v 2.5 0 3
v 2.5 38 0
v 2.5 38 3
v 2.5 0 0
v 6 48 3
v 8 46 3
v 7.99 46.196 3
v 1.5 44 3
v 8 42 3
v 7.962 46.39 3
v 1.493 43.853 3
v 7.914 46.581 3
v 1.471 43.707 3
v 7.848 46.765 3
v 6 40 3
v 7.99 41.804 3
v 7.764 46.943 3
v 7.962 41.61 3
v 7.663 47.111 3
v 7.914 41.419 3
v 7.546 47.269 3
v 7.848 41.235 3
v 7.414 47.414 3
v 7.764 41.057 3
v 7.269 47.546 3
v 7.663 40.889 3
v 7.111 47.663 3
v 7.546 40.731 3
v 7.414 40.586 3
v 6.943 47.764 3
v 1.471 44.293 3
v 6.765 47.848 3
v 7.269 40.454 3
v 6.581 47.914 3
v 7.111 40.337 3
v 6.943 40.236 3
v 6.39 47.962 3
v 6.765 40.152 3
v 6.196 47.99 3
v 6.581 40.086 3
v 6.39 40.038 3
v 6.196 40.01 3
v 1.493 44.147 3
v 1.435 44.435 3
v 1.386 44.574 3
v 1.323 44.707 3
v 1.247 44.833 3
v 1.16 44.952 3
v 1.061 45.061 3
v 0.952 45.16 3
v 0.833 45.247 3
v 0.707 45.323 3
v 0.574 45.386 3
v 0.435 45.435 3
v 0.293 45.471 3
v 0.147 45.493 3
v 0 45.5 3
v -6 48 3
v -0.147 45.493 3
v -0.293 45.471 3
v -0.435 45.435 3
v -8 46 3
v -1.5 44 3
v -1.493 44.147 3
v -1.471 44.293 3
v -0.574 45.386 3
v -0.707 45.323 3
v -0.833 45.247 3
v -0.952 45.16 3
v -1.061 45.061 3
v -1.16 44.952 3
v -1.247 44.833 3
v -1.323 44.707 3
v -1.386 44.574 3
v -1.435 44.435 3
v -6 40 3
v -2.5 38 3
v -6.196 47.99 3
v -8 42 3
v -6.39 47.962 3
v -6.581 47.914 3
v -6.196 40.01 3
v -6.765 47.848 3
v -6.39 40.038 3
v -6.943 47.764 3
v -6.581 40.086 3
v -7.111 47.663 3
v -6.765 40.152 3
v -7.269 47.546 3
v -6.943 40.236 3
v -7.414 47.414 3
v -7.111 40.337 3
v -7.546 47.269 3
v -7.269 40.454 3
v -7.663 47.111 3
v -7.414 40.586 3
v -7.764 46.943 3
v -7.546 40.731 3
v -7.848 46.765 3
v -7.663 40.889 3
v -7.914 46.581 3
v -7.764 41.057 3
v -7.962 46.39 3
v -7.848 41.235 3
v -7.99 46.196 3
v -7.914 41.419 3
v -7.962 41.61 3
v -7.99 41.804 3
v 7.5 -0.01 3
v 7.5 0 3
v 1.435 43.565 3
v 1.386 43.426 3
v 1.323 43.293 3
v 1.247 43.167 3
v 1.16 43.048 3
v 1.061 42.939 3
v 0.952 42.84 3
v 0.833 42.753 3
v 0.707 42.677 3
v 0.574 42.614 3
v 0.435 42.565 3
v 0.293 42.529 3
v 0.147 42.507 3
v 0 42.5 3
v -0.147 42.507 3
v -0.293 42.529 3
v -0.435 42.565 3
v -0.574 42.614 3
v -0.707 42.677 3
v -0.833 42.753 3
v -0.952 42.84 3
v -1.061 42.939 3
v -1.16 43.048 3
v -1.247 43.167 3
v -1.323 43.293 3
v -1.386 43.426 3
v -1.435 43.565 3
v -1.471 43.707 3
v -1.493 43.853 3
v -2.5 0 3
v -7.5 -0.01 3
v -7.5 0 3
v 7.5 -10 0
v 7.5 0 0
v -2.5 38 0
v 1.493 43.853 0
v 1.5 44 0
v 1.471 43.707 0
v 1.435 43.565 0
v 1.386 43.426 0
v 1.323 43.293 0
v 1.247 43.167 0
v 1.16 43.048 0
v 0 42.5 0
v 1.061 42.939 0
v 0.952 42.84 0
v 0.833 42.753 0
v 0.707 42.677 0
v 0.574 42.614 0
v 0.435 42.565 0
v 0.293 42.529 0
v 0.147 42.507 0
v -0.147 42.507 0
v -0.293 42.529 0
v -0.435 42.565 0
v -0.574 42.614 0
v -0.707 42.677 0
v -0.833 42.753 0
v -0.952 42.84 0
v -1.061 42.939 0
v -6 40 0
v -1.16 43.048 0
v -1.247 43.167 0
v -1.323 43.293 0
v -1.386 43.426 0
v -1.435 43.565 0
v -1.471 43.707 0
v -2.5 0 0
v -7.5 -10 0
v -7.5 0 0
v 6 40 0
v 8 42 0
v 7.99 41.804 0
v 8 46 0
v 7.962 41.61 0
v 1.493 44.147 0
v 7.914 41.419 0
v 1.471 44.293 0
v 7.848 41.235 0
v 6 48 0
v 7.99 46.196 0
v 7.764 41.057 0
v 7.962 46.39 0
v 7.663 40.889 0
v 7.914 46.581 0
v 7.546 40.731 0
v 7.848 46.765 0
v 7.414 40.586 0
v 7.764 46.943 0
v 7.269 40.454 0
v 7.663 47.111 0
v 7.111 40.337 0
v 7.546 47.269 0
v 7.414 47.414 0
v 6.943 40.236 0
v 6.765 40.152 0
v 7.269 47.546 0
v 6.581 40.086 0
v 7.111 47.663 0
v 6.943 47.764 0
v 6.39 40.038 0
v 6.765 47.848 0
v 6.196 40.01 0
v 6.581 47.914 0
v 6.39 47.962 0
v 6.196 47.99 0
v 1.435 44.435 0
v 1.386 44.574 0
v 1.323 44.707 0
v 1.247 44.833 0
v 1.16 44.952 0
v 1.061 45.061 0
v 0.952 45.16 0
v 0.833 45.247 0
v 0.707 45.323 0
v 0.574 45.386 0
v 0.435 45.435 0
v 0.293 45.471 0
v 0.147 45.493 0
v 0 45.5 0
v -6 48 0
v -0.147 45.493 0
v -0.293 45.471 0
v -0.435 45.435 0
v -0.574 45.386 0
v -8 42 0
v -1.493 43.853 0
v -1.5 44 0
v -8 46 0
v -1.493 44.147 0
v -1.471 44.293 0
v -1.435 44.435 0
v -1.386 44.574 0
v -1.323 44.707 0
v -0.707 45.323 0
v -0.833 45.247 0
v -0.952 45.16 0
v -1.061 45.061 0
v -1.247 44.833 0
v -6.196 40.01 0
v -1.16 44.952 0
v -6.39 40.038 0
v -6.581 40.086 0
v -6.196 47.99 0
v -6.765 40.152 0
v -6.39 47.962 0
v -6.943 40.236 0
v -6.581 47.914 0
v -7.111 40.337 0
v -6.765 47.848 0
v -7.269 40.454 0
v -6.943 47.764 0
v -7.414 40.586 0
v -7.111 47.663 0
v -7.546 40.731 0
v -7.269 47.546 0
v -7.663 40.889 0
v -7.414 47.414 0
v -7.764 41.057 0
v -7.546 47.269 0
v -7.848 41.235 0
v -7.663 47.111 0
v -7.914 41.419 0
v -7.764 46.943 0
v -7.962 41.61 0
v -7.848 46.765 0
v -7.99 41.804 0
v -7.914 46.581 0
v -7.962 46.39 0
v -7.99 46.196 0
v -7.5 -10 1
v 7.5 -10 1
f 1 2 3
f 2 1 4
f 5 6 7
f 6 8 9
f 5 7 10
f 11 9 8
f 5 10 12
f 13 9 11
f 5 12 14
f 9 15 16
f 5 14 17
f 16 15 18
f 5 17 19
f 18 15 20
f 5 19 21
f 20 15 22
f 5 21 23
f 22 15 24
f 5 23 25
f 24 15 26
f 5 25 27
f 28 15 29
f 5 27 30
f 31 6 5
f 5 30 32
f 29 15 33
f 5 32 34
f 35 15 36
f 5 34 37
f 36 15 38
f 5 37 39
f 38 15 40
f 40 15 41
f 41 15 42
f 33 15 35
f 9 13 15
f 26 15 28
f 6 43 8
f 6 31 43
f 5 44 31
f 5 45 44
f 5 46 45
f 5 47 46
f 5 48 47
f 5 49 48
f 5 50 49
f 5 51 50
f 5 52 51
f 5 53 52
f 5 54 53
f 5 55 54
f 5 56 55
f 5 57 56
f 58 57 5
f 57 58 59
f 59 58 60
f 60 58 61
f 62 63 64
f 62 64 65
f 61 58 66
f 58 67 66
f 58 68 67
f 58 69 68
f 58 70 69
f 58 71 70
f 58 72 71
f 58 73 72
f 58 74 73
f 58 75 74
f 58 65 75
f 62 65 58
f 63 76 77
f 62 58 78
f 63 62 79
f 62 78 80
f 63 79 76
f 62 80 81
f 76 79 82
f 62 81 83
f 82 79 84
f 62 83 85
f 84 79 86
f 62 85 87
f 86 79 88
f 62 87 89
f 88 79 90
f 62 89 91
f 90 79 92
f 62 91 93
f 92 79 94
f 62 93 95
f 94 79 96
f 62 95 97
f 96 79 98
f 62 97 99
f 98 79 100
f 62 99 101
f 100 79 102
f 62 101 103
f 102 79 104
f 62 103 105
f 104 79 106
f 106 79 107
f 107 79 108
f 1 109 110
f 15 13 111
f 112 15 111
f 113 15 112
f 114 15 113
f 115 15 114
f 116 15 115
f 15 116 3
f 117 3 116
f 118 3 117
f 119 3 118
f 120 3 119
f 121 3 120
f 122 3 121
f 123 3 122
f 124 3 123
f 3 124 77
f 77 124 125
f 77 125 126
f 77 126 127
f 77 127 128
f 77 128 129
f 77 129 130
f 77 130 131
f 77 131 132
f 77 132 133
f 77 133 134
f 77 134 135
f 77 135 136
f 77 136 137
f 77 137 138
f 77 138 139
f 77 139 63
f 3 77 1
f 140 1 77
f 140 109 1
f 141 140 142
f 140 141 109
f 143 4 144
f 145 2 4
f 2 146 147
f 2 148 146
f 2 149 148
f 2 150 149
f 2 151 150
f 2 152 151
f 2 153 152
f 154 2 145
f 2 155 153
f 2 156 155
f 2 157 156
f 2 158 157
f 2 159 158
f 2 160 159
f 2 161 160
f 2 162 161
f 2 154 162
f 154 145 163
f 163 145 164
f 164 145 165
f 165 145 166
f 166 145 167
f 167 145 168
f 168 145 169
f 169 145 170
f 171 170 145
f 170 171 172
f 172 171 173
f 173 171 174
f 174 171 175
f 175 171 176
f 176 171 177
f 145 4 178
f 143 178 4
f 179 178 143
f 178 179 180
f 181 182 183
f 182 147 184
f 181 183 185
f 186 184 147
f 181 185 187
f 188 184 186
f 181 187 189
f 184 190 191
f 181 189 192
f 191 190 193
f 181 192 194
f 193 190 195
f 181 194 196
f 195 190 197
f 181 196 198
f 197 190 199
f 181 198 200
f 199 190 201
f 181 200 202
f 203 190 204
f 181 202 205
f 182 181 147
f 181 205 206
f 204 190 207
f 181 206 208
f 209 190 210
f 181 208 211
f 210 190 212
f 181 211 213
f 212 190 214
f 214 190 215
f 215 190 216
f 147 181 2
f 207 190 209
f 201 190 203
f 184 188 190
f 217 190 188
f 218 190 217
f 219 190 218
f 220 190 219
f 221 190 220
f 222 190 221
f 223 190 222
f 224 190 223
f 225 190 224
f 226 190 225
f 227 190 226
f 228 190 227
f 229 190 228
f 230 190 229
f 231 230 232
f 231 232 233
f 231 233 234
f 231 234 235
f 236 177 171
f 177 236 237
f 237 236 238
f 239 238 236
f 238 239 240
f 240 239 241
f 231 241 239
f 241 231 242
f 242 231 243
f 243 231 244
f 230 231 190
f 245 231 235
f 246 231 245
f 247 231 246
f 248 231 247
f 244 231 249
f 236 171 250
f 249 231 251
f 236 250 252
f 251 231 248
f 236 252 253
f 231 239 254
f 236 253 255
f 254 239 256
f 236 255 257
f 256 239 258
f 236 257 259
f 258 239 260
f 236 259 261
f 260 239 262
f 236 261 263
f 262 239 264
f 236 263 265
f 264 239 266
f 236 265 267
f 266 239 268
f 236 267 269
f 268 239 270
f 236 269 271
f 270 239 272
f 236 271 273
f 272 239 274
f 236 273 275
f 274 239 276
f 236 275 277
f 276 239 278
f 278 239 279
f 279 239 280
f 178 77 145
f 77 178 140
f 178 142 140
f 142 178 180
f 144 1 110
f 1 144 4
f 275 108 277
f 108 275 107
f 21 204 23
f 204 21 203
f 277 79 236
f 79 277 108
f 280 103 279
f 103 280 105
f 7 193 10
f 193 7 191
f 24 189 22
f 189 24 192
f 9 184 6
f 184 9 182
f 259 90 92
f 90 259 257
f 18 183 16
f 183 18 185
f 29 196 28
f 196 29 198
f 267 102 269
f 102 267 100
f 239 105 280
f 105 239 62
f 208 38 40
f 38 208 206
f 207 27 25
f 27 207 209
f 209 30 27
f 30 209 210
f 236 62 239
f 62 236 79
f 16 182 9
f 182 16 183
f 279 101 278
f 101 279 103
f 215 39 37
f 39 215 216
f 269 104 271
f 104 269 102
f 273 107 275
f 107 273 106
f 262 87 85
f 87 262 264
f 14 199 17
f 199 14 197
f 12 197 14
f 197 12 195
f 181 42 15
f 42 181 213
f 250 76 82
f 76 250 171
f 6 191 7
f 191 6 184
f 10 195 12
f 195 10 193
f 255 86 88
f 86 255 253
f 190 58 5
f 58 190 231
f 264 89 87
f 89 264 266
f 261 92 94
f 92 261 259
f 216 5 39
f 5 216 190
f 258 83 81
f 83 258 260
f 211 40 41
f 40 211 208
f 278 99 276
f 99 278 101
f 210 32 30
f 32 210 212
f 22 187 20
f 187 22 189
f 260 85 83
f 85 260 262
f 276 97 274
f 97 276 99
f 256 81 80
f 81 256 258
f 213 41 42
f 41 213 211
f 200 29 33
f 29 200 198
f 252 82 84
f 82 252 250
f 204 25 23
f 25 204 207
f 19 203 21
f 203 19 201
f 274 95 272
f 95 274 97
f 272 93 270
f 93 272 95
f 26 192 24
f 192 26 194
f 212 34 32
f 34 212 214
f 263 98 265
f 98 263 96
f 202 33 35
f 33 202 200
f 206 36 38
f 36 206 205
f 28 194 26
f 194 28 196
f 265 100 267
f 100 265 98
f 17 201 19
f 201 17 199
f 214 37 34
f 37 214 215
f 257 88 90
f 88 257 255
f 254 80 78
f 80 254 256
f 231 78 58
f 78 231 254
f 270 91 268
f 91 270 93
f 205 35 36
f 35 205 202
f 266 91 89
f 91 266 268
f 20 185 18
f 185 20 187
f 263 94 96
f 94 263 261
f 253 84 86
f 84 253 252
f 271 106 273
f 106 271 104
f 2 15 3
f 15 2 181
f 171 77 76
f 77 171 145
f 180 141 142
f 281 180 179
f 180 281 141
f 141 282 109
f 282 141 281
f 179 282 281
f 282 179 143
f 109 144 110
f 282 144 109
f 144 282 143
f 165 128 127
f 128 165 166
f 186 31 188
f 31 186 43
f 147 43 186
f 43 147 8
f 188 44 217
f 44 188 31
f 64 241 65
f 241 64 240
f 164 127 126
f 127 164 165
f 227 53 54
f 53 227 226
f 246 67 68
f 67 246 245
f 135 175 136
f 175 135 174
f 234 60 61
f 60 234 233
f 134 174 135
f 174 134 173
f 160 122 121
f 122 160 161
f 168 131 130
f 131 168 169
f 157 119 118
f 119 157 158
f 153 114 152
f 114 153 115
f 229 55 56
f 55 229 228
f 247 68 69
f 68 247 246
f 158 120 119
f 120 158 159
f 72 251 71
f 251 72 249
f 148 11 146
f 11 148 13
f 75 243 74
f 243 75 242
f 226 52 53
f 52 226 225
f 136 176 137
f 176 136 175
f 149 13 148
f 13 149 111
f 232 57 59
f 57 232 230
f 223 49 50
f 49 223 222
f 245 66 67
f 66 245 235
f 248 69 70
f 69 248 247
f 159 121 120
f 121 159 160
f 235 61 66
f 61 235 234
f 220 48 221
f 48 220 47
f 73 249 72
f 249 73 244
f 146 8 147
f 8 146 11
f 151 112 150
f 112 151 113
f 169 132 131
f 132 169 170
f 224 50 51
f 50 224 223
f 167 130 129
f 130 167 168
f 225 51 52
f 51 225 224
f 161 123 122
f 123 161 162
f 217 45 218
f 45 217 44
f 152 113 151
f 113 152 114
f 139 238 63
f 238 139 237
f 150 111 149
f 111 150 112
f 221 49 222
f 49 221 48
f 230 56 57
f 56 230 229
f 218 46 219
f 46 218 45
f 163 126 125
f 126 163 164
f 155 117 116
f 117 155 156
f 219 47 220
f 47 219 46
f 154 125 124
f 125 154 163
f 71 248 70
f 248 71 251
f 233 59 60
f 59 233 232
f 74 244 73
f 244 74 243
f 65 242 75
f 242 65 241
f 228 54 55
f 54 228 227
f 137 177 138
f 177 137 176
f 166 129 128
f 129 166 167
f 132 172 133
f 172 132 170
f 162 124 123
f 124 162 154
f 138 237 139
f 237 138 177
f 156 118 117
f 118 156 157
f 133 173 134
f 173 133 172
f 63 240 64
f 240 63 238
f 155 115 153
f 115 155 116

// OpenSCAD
// =====================================================================
// Parametric Glue Paddle / Crafting Spatula with Top Grip Handle
// Units: millimeters (mm)
// =====================================================================

$fn = 64; // Surface smoothness

// --- Shaft / Stem Parameters ---
shaft_length = 40.0;   // Length of the central shaft (Y axis)
shaft_width  = 5.0;    // Width of the shaft (X axis)
shaft_thick  = 3.0;    // Thickness of the shaft (Z axis)

// --- Top Grip / Handle Parameters ---
// Forms a comfortable T-style grip or rounded paddle cap
top_handle_width  = 16.0;  // Total width across the top grip (X axis)
top_handle_length = 8.0;   // Depth / height along Y axis
top_handle_thick  = 3.0;   // Thickness (Z axis - keep matched to shaft for flat printing)
top_handle_radius = 2.0;   // Corner rounding radius for comfort

// --- Blade / Spade Parameters ---
blade_width       = 15.0;  // Width across the paddle (X axis)
blade_length      = 10.0;  // Length extending forward (Y axis)
blade_thick_start = 3.0;   // Thickness at the shaft junction (Z axis)
blade_thick_tip   = 1.0;   // Tapered edge thickness at the working tip (Z axis)

// --- Optional Features ---
add_hanging_hole = true;  // Set true to add a pegboard/lanyard hole in the grip
hole_diameter    = 3.0;

// =====================================================================
// Helper: 2D Rounded Rectangle (for extruded smooth shapes)
// =====================================================================
module rounded_rect_2d(w, l, r) {
    hull() {
        translate([-w/2 + r, -l/2 + r]) circle(r = r);
        translate([ w/2 - r, -l/2 + r]) circle(r = r);
        translate([-w/2 + r,  l/2 - r]) circle(r = r);
        translate([ w/2 - r,  l/2 - r]) circle(r = r);
    }
}

// =====================================================================
// Main Model
// =====================================================================
module glue_paddle() {
    difference() {
        union() {
            // 1. Central Shaft
            translate([-shaft_width / 2, 0, 0])
                cube([shaft_width, shaft_length, shaft_thick]);

            // 2. Top Grip Handle (Centered at top end of shaft)
            translate([0, shaft_length + top_handle_length / 2, 0])
                linear_extrude(height = top_handle_thick)
                    rounded_rect_2d(top_handle_width, top_handle_length, top_handle_radius);

            // 3. Smooth Transition / Fillet between Shaft and Top Grip
            hull() {
                translate([-shaft_width / 2, shaft_length - 2, 0])
                    cube([shaft_width, 2, shaft_thick]);
                translate([-top_handle_width / 2 + top_handle_radius, shaft_length, 0])
                    cube([top_handle_width - (top_handle_radius * 2), 2, top_handle_thick]);
            }

            // 4. Tapered Spade Blade (Extends forward along -Y)
            hull() {
                // Junction at Y = 0
                translate([-blade_width / 2, -0.01, 0])
                    cube([blade_width, 0.01, blade_thick_start]);

                // Thin working edge at tip
                translate([-blade_width / 2, -blade_length, 0])
                    cube([blade_width, 0.01, blade_thick_tip]);
            }
        }

        // Optional Lanyard / Peg Hole in the Top Grip
        if (add_hanging_hole) {
            translate([0, shaft_length + top_handle_length / 2, -1])
                cylinder(d = hole_diameter, h = top_handle_thick + 2);
        }
    }
}

glue_paddle();
